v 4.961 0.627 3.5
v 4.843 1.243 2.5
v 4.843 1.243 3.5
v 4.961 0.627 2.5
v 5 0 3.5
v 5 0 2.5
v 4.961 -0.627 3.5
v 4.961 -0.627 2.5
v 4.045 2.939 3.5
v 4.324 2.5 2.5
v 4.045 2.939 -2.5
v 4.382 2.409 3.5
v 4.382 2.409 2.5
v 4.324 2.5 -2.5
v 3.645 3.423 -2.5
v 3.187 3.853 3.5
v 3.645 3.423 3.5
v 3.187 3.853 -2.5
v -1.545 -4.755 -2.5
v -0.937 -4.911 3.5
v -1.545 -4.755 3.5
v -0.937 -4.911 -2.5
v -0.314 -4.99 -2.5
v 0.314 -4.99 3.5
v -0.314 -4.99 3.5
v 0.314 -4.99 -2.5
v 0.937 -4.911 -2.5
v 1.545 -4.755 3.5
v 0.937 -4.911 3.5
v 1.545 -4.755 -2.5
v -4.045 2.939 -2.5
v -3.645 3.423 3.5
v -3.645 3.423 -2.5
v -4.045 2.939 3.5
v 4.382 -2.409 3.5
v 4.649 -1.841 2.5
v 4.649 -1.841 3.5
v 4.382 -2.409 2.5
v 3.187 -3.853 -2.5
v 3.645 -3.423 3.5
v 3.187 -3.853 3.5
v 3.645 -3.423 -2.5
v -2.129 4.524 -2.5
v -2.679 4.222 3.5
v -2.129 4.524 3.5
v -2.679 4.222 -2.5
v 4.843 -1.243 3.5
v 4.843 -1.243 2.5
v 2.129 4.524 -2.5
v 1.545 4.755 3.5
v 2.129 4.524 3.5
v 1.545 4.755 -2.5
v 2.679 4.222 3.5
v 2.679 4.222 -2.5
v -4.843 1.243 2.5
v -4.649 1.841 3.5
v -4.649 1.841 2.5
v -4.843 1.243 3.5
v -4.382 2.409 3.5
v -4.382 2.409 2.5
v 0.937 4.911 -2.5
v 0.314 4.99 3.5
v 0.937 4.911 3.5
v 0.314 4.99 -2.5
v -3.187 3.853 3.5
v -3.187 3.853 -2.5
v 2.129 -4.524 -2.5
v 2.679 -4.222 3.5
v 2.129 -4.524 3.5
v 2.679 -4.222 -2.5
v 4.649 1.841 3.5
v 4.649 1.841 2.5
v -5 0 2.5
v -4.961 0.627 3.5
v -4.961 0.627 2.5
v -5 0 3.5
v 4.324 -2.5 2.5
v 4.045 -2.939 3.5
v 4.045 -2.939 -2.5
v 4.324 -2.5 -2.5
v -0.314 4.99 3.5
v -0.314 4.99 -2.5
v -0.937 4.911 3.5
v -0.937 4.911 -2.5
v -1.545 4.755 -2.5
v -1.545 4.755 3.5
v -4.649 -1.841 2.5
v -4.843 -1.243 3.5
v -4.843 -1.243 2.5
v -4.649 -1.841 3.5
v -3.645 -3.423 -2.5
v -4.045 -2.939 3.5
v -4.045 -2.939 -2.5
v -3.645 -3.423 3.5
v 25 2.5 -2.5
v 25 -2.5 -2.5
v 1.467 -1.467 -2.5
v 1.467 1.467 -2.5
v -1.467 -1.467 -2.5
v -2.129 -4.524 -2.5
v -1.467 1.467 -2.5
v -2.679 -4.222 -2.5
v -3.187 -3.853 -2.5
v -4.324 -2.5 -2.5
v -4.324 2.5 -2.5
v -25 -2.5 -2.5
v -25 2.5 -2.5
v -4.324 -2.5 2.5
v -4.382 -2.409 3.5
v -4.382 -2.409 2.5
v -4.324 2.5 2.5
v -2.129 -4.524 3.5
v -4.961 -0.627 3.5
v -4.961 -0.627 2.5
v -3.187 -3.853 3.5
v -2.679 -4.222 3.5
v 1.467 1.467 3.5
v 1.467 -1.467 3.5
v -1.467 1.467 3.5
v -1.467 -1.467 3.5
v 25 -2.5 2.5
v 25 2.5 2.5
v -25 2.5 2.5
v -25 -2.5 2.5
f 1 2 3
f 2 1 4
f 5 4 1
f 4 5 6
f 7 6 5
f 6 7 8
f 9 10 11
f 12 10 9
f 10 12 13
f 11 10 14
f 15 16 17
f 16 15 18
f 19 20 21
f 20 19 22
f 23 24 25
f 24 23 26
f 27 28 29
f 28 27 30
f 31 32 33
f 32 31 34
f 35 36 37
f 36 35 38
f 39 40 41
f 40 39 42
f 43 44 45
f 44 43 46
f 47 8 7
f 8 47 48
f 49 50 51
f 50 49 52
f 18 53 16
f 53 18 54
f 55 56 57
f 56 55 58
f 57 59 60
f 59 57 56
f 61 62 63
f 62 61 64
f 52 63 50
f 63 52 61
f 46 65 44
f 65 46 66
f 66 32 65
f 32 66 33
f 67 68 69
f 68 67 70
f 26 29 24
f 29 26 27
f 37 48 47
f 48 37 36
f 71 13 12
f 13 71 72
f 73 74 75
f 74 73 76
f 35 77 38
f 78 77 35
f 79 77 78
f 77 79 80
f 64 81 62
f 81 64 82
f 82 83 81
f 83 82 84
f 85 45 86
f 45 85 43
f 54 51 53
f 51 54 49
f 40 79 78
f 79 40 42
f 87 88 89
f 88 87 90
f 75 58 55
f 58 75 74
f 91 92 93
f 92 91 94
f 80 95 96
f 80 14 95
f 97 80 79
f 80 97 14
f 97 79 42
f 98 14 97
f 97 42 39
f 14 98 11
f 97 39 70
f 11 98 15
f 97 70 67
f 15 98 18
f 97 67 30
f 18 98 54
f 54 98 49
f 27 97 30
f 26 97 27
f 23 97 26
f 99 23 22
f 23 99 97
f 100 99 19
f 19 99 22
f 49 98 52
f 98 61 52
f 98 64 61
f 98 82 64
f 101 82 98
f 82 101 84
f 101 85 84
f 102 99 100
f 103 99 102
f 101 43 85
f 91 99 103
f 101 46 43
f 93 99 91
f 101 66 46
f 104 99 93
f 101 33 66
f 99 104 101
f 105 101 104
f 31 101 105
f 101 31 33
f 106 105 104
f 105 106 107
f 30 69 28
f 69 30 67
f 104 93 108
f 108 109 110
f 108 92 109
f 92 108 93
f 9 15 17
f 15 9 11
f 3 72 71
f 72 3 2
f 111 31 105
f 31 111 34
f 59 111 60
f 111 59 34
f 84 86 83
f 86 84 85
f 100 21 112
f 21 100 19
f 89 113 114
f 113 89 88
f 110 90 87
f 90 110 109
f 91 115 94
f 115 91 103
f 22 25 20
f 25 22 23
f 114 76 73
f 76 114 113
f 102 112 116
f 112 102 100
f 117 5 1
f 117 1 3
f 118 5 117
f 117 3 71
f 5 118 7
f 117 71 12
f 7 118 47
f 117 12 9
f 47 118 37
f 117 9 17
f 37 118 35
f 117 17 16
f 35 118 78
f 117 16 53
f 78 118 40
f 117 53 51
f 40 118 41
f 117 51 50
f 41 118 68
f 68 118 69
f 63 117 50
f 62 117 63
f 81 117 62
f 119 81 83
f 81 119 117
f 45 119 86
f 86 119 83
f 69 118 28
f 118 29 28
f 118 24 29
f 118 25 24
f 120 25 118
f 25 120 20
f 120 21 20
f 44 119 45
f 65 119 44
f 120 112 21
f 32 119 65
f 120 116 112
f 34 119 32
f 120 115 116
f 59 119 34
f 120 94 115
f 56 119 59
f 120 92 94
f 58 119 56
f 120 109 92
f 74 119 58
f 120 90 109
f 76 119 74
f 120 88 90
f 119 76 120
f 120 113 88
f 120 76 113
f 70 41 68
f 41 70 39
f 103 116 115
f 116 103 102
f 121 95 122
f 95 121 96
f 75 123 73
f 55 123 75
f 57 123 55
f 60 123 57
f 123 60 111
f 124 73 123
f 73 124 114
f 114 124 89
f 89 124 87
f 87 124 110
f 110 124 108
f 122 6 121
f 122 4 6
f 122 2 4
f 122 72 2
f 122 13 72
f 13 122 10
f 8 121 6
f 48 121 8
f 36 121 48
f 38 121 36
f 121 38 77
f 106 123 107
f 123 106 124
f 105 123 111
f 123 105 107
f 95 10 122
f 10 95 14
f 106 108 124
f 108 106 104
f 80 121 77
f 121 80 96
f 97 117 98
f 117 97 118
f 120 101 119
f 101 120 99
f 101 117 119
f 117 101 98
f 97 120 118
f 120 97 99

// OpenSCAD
M3_tap_flats = 2.794;
tap_flats_clearance = 0.07;
handle_length = 50;
$fn=50;
module tap_hole() {
    a = M3_tap_flats + 2*tap_flats_clearance;
    cube([a,a,20],center=true);
}

module tap_body() {
    translate([0,0,0.5]) cylinder(d=10,h=6,center=true);
    cube([handle_length,5,5],center=true);
}

difference() {
    tap_body();
    tap_hole();
}
